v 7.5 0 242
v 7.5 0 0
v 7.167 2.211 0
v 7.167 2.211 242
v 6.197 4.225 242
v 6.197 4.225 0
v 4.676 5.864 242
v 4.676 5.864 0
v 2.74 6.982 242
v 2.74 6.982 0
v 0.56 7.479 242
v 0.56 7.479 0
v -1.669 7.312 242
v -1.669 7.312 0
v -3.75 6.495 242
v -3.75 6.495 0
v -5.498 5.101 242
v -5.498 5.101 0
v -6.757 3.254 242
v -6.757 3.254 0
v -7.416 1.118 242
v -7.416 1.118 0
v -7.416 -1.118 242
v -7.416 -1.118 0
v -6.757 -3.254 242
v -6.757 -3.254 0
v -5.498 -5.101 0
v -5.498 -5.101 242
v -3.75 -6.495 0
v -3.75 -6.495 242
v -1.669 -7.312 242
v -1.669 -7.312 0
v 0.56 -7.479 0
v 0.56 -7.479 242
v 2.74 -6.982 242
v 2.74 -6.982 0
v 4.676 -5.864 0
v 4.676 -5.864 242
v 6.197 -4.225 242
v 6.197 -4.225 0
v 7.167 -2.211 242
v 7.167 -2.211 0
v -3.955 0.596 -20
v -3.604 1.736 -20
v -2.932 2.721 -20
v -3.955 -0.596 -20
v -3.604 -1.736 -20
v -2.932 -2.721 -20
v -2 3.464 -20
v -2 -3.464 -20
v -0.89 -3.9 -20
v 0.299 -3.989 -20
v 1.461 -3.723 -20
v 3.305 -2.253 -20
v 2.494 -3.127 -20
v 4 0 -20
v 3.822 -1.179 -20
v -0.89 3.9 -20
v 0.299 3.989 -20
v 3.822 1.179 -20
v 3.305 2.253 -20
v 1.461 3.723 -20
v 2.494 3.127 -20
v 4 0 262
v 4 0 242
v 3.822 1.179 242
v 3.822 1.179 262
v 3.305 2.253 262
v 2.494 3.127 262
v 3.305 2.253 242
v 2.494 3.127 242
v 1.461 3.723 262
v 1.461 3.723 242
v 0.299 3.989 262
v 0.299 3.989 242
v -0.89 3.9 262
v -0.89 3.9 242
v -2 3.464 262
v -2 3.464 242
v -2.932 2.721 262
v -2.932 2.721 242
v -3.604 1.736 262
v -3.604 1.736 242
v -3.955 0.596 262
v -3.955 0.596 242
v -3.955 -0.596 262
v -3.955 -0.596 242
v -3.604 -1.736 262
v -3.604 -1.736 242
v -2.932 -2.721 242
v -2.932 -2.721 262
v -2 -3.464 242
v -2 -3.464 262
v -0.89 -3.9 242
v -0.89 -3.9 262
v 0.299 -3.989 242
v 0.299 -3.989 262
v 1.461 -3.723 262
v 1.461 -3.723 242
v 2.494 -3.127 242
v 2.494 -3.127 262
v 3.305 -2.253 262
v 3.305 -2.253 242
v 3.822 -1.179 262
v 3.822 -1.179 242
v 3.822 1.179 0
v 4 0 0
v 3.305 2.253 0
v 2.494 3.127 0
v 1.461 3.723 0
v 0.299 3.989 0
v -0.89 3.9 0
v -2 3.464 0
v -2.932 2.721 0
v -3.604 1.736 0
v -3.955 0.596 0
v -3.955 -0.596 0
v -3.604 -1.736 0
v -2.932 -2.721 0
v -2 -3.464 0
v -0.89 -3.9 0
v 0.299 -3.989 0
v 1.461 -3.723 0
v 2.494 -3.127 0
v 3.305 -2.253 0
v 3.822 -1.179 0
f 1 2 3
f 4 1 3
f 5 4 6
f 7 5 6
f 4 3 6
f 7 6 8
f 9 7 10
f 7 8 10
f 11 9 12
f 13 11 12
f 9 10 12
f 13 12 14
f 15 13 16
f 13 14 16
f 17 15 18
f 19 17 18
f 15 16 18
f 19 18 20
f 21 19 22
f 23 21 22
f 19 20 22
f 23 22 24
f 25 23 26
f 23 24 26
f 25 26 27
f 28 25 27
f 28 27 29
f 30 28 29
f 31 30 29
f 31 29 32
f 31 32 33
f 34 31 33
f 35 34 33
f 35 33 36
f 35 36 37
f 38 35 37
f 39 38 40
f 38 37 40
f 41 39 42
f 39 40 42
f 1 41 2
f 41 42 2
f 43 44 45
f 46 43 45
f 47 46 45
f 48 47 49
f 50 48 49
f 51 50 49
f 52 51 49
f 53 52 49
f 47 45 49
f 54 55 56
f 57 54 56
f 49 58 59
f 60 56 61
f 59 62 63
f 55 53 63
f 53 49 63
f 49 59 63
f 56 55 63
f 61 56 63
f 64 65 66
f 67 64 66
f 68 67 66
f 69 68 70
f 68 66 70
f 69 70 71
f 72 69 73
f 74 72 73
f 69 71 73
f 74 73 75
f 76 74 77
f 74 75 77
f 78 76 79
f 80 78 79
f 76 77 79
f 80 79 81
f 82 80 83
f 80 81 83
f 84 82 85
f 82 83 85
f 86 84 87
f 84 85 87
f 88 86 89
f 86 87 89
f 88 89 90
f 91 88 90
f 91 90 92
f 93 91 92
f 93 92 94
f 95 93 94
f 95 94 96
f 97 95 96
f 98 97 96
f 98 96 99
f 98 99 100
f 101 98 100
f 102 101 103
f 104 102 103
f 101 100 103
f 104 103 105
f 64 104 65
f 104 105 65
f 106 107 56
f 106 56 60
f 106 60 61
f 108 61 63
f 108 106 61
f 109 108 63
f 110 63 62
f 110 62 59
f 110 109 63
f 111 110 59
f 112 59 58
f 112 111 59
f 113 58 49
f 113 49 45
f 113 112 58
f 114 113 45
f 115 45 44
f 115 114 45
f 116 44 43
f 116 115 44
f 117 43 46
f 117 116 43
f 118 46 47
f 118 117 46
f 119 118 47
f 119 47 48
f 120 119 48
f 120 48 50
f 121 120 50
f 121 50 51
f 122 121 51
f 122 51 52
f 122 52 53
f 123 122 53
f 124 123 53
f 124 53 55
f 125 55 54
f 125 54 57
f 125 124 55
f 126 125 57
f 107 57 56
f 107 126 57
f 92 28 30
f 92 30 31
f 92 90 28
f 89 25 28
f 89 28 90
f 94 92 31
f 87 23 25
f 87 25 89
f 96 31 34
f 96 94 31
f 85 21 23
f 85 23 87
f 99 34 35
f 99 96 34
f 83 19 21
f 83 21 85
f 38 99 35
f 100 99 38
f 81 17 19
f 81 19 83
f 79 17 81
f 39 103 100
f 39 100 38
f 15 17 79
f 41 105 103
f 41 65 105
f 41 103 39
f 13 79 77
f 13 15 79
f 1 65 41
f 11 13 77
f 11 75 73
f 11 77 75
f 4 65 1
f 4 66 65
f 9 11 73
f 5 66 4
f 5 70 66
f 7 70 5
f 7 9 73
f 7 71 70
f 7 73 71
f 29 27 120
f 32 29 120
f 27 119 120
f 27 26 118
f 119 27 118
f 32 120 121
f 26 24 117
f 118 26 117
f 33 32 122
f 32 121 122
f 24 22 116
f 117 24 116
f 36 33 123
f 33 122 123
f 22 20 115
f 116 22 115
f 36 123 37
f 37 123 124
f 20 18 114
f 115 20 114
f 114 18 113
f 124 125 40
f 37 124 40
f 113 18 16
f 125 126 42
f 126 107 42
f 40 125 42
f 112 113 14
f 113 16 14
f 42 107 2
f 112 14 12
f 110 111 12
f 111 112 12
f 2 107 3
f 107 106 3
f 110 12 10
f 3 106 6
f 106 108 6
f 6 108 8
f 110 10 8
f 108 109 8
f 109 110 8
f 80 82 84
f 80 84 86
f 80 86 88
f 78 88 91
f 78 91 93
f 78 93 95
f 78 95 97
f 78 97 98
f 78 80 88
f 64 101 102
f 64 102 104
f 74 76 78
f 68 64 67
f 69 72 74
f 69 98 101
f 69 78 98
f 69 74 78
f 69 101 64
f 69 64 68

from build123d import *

# Parameters (mm, degrees)
SKETCH1_R           = 7.5
BOSS_EXTRUDE1_DEPTH = 242
SKETCH2_R           = 4
BOSS_EXTRUDE2_DEPTH = 20


with BuildPart() as part:
    # Sketch1 → Boss-Extrude1 (new body)
    with BuildSketch(Plane.XY):
        Circle(SKETCH1_R)
    extrude(amount=BOSS_EXTRUDE1_DEPTH)

    # Sketch2 → Boss-Extrude2 (add)
    with BuildSketch(Plane.XY.offset(242)):
        Circle(SKETCH2_R)
    boss_extrude2 = extrude(amount=BOSS_EXTRUDE2_DEPTH)

    # Mirror1: Boss-Extrude2 across plane
    add(boss_extrude2.mirror(Plane.XY.offset(121)))


solid = part.part
